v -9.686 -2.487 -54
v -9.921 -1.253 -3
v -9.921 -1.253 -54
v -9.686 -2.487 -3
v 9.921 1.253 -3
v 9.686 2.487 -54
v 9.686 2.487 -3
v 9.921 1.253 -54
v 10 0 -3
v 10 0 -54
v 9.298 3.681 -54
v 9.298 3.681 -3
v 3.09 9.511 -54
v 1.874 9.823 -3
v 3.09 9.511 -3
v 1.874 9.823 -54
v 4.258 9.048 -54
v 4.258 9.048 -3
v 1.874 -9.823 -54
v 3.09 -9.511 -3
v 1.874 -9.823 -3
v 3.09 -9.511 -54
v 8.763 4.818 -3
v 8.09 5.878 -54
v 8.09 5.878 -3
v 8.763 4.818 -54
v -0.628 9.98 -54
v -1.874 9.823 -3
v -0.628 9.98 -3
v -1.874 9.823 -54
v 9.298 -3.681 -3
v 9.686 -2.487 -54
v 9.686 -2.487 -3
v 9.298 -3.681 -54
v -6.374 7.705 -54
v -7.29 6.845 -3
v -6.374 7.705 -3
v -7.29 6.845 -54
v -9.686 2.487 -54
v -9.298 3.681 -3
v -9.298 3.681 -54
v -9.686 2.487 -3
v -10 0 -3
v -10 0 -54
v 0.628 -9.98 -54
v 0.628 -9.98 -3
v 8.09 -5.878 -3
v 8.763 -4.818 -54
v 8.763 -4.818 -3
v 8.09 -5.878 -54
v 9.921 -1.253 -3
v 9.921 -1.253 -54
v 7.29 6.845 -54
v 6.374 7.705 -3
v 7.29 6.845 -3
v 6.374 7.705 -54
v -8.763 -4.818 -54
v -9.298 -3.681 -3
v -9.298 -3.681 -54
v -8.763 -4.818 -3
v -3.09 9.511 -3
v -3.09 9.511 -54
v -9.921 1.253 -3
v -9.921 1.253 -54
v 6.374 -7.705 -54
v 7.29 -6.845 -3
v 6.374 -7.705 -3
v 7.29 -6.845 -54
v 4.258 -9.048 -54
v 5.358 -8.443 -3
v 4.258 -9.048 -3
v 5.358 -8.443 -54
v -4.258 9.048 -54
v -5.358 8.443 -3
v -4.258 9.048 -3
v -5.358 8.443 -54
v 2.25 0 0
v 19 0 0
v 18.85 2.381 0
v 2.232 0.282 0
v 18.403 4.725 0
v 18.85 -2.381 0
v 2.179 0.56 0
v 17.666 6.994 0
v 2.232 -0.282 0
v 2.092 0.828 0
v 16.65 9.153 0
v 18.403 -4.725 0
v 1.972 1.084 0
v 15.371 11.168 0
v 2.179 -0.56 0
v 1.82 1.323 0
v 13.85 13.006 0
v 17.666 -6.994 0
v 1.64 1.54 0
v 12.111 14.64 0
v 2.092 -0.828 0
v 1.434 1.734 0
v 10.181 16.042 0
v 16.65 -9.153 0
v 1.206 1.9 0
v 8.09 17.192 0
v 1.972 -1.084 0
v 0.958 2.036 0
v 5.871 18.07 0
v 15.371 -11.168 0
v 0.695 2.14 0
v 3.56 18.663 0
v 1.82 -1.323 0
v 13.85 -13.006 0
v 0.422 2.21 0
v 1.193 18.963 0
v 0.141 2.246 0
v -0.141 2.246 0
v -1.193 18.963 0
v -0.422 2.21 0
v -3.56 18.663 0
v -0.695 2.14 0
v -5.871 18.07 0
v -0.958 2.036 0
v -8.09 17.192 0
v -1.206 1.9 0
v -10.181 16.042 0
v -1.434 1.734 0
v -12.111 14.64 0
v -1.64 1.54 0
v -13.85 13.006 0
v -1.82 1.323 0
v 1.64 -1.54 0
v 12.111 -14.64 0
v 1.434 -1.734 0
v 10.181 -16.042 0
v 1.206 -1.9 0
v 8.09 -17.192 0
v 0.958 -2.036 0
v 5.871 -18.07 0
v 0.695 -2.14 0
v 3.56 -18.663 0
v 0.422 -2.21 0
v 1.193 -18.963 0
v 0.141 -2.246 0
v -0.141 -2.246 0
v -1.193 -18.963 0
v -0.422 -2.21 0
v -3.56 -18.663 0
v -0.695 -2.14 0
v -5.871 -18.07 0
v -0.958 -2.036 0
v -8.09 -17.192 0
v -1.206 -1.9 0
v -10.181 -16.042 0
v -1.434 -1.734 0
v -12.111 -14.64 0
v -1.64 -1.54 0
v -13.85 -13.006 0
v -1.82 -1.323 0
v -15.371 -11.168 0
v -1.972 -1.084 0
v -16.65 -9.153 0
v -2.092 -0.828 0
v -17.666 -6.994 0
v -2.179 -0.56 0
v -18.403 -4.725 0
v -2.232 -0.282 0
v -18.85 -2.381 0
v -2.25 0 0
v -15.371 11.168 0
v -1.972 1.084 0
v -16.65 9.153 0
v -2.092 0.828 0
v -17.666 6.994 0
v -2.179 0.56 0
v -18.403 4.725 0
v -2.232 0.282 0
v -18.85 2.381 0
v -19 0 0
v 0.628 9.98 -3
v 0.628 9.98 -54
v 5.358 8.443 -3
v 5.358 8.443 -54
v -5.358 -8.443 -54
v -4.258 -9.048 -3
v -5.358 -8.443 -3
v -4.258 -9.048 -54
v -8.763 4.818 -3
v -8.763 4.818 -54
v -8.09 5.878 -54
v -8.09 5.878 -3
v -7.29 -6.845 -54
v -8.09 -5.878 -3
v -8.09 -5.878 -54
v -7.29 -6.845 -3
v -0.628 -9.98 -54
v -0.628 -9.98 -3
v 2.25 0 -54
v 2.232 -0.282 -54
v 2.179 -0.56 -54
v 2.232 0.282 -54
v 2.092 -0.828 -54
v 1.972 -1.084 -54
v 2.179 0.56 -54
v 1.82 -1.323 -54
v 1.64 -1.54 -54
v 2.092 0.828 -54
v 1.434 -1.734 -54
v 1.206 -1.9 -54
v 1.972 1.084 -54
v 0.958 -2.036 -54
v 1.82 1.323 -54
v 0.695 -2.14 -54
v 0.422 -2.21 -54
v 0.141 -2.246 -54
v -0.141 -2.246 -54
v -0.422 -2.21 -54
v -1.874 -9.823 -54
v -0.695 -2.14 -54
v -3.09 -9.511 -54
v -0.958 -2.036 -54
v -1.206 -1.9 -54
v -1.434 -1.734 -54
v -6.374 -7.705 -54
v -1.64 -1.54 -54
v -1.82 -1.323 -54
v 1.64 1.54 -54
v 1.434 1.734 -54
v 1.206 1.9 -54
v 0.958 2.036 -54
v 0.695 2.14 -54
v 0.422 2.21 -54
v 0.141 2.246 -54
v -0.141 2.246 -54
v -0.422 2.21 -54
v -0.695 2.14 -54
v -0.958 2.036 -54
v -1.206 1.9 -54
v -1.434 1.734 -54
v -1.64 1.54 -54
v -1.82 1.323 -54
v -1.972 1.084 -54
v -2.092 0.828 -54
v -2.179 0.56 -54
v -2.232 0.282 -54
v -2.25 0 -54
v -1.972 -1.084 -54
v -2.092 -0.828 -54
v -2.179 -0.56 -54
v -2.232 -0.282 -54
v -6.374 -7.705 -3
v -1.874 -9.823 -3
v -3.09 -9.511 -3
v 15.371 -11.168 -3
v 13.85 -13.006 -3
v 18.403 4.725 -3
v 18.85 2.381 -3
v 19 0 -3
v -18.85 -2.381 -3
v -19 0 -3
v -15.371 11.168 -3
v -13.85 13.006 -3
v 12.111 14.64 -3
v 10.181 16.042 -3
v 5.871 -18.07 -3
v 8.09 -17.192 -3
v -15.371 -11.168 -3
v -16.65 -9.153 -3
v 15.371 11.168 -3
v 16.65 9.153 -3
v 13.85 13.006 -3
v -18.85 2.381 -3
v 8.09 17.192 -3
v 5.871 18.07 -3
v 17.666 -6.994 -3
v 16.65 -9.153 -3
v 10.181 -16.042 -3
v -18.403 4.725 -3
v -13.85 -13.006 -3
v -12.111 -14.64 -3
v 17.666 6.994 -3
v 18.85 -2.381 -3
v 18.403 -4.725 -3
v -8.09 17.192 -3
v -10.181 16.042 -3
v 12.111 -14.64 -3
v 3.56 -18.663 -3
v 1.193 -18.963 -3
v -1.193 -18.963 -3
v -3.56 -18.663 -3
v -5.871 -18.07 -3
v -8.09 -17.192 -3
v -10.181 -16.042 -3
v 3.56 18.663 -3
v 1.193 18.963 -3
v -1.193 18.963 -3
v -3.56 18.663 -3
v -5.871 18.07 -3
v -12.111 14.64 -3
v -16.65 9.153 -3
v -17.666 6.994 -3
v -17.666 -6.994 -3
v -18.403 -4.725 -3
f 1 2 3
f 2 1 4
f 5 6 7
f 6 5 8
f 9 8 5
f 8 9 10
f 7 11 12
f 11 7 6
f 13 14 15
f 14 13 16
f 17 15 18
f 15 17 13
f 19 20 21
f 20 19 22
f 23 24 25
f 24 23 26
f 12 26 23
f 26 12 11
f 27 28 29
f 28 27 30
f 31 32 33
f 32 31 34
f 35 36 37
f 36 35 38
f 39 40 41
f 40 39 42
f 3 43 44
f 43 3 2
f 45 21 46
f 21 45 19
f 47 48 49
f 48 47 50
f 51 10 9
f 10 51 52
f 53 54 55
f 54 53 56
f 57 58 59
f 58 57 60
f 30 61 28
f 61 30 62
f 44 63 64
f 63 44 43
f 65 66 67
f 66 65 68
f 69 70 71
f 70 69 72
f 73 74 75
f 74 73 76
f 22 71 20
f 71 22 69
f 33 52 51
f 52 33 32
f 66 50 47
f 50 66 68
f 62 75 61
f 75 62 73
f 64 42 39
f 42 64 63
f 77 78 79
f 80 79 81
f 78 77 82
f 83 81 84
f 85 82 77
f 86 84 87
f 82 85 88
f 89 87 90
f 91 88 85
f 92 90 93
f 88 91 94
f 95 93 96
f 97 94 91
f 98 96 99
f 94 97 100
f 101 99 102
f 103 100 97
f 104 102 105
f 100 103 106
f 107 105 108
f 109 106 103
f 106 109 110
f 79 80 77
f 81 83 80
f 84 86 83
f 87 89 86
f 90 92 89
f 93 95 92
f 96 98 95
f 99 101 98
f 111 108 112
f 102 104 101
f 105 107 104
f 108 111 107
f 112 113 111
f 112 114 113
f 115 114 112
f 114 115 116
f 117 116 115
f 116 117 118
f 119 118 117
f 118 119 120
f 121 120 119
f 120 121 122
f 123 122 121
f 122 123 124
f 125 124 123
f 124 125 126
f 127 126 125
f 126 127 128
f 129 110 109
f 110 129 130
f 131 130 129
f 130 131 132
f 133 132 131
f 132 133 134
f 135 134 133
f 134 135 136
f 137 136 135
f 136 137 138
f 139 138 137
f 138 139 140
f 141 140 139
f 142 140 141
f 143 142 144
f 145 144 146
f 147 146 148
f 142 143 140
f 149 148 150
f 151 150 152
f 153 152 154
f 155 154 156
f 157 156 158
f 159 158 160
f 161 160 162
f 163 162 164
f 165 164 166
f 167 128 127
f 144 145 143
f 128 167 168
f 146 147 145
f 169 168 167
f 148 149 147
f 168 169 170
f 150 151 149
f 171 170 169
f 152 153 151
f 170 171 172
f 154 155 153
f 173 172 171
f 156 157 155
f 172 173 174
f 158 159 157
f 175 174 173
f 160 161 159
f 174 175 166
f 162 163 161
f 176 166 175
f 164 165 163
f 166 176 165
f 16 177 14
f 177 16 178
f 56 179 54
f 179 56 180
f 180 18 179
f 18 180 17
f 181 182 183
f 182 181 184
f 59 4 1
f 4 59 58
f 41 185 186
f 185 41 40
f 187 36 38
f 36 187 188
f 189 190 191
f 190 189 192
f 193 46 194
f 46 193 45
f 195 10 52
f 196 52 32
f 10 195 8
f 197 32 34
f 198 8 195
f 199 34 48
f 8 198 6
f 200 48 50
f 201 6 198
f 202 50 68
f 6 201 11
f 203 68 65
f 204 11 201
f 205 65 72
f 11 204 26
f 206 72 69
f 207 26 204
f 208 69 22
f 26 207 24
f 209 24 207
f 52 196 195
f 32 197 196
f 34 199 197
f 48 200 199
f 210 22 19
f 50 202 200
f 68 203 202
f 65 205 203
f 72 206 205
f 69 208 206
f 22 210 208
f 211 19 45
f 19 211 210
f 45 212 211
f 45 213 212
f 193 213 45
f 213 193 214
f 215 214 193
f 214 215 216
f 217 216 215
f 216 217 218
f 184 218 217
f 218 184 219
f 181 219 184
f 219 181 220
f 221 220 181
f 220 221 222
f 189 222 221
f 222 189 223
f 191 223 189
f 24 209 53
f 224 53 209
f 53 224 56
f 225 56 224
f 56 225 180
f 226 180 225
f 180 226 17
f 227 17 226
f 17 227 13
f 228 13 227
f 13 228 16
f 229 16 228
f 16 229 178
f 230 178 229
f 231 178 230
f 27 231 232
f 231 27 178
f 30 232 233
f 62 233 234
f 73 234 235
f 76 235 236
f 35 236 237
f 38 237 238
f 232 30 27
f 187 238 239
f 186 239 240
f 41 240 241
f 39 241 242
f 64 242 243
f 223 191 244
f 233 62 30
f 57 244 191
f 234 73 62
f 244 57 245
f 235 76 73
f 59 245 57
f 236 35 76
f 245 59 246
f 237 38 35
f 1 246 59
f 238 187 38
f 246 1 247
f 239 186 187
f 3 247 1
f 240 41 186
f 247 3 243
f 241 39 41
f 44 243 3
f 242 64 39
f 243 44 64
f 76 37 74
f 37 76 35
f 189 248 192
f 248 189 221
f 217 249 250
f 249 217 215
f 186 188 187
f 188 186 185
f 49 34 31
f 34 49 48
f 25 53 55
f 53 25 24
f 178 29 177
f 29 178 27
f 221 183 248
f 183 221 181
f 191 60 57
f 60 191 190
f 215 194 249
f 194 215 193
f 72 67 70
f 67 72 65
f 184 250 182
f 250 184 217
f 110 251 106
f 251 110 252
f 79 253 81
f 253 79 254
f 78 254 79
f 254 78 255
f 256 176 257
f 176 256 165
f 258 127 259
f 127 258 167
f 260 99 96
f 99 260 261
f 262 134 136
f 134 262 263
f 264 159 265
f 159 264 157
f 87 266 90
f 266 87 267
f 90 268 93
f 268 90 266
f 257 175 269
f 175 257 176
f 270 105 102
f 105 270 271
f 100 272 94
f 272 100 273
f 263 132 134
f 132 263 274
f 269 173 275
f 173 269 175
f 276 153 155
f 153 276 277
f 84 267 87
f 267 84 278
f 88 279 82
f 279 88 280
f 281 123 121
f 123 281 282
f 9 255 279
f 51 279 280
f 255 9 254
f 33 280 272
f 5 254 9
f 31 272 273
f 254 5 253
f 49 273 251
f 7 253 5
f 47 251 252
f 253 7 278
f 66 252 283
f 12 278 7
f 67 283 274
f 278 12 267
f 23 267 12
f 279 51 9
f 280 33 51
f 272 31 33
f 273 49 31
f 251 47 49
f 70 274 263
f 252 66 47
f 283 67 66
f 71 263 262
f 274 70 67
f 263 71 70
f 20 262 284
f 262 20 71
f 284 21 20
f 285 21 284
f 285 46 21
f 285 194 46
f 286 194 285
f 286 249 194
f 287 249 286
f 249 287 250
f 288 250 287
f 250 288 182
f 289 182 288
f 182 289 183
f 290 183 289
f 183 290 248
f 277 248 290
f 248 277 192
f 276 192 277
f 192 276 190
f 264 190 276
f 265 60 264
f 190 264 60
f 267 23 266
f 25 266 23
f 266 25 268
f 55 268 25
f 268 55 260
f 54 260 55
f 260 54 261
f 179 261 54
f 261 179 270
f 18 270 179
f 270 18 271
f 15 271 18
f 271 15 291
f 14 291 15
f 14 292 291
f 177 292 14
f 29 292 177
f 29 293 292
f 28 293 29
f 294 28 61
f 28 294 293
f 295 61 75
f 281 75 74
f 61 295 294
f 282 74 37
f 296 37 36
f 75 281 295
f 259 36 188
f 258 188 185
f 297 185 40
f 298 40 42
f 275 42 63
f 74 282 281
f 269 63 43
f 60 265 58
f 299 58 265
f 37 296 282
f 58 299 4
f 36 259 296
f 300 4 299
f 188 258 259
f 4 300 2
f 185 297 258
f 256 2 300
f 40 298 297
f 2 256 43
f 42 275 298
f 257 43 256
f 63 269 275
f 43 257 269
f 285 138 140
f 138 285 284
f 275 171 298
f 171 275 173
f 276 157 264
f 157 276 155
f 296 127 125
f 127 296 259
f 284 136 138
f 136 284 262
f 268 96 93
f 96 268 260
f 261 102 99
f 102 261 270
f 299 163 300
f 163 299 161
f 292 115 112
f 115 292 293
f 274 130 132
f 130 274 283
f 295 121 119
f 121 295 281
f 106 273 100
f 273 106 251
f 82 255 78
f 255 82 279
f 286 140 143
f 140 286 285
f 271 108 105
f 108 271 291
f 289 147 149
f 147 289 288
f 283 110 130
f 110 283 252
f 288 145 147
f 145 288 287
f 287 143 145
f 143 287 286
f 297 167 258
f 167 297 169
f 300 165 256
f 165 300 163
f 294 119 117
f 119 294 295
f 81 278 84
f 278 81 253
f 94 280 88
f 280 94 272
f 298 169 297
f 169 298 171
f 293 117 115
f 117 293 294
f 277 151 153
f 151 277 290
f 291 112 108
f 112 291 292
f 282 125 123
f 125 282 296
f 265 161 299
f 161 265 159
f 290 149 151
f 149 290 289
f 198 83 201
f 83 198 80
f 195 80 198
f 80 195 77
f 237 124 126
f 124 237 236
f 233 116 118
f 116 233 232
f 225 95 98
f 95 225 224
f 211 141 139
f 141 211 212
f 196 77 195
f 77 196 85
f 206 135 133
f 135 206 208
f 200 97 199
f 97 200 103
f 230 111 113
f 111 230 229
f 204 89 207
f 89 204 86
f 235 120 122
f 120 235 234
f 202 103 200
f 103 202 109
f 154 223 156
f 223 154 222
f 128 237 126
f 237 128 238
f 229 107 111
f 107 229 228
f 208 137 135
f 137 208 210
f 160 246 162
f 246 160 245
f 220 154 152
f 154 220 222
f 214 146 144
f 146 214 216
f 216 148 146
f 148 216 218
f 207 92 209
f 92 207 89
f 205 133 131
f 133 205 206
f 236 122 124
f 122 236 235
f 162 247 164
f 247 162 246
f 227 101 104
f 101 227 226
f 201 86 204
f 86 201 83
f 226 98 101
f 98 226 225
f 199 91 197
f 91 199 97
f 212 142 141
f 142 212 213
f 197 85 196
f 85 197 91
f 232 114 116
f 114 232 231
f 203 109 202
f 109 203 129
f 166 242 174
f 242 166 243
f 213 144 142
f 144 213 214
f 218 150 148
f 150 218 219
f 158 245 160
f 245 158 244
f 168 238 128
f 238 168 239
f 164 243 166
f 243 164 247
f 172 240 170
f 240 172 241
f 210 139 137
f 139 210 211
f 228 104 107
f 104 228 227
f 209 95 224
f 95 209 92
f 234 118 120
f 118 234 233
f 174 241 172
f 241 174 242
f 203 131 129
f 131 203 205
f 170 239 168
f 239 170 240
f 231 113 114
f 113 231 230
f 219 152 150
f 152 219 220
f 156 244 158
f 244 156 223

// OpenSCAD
$fn = 50;


difference() {
	union() {
		translate(v = [0, 0, -54.0000000000]) {
			cylinder(h = 54, r = 10.0000000000);
		}
		translate(v = [0, 0, -3.0000000000]) {
			cylinder(h = 3, r = 19.0000000000);
		}
	}
	union() {
		#translate(v = [0, 0, -54]) {
			cylinder(h = 54, r = 2.2500000000);
		}
	}
}
